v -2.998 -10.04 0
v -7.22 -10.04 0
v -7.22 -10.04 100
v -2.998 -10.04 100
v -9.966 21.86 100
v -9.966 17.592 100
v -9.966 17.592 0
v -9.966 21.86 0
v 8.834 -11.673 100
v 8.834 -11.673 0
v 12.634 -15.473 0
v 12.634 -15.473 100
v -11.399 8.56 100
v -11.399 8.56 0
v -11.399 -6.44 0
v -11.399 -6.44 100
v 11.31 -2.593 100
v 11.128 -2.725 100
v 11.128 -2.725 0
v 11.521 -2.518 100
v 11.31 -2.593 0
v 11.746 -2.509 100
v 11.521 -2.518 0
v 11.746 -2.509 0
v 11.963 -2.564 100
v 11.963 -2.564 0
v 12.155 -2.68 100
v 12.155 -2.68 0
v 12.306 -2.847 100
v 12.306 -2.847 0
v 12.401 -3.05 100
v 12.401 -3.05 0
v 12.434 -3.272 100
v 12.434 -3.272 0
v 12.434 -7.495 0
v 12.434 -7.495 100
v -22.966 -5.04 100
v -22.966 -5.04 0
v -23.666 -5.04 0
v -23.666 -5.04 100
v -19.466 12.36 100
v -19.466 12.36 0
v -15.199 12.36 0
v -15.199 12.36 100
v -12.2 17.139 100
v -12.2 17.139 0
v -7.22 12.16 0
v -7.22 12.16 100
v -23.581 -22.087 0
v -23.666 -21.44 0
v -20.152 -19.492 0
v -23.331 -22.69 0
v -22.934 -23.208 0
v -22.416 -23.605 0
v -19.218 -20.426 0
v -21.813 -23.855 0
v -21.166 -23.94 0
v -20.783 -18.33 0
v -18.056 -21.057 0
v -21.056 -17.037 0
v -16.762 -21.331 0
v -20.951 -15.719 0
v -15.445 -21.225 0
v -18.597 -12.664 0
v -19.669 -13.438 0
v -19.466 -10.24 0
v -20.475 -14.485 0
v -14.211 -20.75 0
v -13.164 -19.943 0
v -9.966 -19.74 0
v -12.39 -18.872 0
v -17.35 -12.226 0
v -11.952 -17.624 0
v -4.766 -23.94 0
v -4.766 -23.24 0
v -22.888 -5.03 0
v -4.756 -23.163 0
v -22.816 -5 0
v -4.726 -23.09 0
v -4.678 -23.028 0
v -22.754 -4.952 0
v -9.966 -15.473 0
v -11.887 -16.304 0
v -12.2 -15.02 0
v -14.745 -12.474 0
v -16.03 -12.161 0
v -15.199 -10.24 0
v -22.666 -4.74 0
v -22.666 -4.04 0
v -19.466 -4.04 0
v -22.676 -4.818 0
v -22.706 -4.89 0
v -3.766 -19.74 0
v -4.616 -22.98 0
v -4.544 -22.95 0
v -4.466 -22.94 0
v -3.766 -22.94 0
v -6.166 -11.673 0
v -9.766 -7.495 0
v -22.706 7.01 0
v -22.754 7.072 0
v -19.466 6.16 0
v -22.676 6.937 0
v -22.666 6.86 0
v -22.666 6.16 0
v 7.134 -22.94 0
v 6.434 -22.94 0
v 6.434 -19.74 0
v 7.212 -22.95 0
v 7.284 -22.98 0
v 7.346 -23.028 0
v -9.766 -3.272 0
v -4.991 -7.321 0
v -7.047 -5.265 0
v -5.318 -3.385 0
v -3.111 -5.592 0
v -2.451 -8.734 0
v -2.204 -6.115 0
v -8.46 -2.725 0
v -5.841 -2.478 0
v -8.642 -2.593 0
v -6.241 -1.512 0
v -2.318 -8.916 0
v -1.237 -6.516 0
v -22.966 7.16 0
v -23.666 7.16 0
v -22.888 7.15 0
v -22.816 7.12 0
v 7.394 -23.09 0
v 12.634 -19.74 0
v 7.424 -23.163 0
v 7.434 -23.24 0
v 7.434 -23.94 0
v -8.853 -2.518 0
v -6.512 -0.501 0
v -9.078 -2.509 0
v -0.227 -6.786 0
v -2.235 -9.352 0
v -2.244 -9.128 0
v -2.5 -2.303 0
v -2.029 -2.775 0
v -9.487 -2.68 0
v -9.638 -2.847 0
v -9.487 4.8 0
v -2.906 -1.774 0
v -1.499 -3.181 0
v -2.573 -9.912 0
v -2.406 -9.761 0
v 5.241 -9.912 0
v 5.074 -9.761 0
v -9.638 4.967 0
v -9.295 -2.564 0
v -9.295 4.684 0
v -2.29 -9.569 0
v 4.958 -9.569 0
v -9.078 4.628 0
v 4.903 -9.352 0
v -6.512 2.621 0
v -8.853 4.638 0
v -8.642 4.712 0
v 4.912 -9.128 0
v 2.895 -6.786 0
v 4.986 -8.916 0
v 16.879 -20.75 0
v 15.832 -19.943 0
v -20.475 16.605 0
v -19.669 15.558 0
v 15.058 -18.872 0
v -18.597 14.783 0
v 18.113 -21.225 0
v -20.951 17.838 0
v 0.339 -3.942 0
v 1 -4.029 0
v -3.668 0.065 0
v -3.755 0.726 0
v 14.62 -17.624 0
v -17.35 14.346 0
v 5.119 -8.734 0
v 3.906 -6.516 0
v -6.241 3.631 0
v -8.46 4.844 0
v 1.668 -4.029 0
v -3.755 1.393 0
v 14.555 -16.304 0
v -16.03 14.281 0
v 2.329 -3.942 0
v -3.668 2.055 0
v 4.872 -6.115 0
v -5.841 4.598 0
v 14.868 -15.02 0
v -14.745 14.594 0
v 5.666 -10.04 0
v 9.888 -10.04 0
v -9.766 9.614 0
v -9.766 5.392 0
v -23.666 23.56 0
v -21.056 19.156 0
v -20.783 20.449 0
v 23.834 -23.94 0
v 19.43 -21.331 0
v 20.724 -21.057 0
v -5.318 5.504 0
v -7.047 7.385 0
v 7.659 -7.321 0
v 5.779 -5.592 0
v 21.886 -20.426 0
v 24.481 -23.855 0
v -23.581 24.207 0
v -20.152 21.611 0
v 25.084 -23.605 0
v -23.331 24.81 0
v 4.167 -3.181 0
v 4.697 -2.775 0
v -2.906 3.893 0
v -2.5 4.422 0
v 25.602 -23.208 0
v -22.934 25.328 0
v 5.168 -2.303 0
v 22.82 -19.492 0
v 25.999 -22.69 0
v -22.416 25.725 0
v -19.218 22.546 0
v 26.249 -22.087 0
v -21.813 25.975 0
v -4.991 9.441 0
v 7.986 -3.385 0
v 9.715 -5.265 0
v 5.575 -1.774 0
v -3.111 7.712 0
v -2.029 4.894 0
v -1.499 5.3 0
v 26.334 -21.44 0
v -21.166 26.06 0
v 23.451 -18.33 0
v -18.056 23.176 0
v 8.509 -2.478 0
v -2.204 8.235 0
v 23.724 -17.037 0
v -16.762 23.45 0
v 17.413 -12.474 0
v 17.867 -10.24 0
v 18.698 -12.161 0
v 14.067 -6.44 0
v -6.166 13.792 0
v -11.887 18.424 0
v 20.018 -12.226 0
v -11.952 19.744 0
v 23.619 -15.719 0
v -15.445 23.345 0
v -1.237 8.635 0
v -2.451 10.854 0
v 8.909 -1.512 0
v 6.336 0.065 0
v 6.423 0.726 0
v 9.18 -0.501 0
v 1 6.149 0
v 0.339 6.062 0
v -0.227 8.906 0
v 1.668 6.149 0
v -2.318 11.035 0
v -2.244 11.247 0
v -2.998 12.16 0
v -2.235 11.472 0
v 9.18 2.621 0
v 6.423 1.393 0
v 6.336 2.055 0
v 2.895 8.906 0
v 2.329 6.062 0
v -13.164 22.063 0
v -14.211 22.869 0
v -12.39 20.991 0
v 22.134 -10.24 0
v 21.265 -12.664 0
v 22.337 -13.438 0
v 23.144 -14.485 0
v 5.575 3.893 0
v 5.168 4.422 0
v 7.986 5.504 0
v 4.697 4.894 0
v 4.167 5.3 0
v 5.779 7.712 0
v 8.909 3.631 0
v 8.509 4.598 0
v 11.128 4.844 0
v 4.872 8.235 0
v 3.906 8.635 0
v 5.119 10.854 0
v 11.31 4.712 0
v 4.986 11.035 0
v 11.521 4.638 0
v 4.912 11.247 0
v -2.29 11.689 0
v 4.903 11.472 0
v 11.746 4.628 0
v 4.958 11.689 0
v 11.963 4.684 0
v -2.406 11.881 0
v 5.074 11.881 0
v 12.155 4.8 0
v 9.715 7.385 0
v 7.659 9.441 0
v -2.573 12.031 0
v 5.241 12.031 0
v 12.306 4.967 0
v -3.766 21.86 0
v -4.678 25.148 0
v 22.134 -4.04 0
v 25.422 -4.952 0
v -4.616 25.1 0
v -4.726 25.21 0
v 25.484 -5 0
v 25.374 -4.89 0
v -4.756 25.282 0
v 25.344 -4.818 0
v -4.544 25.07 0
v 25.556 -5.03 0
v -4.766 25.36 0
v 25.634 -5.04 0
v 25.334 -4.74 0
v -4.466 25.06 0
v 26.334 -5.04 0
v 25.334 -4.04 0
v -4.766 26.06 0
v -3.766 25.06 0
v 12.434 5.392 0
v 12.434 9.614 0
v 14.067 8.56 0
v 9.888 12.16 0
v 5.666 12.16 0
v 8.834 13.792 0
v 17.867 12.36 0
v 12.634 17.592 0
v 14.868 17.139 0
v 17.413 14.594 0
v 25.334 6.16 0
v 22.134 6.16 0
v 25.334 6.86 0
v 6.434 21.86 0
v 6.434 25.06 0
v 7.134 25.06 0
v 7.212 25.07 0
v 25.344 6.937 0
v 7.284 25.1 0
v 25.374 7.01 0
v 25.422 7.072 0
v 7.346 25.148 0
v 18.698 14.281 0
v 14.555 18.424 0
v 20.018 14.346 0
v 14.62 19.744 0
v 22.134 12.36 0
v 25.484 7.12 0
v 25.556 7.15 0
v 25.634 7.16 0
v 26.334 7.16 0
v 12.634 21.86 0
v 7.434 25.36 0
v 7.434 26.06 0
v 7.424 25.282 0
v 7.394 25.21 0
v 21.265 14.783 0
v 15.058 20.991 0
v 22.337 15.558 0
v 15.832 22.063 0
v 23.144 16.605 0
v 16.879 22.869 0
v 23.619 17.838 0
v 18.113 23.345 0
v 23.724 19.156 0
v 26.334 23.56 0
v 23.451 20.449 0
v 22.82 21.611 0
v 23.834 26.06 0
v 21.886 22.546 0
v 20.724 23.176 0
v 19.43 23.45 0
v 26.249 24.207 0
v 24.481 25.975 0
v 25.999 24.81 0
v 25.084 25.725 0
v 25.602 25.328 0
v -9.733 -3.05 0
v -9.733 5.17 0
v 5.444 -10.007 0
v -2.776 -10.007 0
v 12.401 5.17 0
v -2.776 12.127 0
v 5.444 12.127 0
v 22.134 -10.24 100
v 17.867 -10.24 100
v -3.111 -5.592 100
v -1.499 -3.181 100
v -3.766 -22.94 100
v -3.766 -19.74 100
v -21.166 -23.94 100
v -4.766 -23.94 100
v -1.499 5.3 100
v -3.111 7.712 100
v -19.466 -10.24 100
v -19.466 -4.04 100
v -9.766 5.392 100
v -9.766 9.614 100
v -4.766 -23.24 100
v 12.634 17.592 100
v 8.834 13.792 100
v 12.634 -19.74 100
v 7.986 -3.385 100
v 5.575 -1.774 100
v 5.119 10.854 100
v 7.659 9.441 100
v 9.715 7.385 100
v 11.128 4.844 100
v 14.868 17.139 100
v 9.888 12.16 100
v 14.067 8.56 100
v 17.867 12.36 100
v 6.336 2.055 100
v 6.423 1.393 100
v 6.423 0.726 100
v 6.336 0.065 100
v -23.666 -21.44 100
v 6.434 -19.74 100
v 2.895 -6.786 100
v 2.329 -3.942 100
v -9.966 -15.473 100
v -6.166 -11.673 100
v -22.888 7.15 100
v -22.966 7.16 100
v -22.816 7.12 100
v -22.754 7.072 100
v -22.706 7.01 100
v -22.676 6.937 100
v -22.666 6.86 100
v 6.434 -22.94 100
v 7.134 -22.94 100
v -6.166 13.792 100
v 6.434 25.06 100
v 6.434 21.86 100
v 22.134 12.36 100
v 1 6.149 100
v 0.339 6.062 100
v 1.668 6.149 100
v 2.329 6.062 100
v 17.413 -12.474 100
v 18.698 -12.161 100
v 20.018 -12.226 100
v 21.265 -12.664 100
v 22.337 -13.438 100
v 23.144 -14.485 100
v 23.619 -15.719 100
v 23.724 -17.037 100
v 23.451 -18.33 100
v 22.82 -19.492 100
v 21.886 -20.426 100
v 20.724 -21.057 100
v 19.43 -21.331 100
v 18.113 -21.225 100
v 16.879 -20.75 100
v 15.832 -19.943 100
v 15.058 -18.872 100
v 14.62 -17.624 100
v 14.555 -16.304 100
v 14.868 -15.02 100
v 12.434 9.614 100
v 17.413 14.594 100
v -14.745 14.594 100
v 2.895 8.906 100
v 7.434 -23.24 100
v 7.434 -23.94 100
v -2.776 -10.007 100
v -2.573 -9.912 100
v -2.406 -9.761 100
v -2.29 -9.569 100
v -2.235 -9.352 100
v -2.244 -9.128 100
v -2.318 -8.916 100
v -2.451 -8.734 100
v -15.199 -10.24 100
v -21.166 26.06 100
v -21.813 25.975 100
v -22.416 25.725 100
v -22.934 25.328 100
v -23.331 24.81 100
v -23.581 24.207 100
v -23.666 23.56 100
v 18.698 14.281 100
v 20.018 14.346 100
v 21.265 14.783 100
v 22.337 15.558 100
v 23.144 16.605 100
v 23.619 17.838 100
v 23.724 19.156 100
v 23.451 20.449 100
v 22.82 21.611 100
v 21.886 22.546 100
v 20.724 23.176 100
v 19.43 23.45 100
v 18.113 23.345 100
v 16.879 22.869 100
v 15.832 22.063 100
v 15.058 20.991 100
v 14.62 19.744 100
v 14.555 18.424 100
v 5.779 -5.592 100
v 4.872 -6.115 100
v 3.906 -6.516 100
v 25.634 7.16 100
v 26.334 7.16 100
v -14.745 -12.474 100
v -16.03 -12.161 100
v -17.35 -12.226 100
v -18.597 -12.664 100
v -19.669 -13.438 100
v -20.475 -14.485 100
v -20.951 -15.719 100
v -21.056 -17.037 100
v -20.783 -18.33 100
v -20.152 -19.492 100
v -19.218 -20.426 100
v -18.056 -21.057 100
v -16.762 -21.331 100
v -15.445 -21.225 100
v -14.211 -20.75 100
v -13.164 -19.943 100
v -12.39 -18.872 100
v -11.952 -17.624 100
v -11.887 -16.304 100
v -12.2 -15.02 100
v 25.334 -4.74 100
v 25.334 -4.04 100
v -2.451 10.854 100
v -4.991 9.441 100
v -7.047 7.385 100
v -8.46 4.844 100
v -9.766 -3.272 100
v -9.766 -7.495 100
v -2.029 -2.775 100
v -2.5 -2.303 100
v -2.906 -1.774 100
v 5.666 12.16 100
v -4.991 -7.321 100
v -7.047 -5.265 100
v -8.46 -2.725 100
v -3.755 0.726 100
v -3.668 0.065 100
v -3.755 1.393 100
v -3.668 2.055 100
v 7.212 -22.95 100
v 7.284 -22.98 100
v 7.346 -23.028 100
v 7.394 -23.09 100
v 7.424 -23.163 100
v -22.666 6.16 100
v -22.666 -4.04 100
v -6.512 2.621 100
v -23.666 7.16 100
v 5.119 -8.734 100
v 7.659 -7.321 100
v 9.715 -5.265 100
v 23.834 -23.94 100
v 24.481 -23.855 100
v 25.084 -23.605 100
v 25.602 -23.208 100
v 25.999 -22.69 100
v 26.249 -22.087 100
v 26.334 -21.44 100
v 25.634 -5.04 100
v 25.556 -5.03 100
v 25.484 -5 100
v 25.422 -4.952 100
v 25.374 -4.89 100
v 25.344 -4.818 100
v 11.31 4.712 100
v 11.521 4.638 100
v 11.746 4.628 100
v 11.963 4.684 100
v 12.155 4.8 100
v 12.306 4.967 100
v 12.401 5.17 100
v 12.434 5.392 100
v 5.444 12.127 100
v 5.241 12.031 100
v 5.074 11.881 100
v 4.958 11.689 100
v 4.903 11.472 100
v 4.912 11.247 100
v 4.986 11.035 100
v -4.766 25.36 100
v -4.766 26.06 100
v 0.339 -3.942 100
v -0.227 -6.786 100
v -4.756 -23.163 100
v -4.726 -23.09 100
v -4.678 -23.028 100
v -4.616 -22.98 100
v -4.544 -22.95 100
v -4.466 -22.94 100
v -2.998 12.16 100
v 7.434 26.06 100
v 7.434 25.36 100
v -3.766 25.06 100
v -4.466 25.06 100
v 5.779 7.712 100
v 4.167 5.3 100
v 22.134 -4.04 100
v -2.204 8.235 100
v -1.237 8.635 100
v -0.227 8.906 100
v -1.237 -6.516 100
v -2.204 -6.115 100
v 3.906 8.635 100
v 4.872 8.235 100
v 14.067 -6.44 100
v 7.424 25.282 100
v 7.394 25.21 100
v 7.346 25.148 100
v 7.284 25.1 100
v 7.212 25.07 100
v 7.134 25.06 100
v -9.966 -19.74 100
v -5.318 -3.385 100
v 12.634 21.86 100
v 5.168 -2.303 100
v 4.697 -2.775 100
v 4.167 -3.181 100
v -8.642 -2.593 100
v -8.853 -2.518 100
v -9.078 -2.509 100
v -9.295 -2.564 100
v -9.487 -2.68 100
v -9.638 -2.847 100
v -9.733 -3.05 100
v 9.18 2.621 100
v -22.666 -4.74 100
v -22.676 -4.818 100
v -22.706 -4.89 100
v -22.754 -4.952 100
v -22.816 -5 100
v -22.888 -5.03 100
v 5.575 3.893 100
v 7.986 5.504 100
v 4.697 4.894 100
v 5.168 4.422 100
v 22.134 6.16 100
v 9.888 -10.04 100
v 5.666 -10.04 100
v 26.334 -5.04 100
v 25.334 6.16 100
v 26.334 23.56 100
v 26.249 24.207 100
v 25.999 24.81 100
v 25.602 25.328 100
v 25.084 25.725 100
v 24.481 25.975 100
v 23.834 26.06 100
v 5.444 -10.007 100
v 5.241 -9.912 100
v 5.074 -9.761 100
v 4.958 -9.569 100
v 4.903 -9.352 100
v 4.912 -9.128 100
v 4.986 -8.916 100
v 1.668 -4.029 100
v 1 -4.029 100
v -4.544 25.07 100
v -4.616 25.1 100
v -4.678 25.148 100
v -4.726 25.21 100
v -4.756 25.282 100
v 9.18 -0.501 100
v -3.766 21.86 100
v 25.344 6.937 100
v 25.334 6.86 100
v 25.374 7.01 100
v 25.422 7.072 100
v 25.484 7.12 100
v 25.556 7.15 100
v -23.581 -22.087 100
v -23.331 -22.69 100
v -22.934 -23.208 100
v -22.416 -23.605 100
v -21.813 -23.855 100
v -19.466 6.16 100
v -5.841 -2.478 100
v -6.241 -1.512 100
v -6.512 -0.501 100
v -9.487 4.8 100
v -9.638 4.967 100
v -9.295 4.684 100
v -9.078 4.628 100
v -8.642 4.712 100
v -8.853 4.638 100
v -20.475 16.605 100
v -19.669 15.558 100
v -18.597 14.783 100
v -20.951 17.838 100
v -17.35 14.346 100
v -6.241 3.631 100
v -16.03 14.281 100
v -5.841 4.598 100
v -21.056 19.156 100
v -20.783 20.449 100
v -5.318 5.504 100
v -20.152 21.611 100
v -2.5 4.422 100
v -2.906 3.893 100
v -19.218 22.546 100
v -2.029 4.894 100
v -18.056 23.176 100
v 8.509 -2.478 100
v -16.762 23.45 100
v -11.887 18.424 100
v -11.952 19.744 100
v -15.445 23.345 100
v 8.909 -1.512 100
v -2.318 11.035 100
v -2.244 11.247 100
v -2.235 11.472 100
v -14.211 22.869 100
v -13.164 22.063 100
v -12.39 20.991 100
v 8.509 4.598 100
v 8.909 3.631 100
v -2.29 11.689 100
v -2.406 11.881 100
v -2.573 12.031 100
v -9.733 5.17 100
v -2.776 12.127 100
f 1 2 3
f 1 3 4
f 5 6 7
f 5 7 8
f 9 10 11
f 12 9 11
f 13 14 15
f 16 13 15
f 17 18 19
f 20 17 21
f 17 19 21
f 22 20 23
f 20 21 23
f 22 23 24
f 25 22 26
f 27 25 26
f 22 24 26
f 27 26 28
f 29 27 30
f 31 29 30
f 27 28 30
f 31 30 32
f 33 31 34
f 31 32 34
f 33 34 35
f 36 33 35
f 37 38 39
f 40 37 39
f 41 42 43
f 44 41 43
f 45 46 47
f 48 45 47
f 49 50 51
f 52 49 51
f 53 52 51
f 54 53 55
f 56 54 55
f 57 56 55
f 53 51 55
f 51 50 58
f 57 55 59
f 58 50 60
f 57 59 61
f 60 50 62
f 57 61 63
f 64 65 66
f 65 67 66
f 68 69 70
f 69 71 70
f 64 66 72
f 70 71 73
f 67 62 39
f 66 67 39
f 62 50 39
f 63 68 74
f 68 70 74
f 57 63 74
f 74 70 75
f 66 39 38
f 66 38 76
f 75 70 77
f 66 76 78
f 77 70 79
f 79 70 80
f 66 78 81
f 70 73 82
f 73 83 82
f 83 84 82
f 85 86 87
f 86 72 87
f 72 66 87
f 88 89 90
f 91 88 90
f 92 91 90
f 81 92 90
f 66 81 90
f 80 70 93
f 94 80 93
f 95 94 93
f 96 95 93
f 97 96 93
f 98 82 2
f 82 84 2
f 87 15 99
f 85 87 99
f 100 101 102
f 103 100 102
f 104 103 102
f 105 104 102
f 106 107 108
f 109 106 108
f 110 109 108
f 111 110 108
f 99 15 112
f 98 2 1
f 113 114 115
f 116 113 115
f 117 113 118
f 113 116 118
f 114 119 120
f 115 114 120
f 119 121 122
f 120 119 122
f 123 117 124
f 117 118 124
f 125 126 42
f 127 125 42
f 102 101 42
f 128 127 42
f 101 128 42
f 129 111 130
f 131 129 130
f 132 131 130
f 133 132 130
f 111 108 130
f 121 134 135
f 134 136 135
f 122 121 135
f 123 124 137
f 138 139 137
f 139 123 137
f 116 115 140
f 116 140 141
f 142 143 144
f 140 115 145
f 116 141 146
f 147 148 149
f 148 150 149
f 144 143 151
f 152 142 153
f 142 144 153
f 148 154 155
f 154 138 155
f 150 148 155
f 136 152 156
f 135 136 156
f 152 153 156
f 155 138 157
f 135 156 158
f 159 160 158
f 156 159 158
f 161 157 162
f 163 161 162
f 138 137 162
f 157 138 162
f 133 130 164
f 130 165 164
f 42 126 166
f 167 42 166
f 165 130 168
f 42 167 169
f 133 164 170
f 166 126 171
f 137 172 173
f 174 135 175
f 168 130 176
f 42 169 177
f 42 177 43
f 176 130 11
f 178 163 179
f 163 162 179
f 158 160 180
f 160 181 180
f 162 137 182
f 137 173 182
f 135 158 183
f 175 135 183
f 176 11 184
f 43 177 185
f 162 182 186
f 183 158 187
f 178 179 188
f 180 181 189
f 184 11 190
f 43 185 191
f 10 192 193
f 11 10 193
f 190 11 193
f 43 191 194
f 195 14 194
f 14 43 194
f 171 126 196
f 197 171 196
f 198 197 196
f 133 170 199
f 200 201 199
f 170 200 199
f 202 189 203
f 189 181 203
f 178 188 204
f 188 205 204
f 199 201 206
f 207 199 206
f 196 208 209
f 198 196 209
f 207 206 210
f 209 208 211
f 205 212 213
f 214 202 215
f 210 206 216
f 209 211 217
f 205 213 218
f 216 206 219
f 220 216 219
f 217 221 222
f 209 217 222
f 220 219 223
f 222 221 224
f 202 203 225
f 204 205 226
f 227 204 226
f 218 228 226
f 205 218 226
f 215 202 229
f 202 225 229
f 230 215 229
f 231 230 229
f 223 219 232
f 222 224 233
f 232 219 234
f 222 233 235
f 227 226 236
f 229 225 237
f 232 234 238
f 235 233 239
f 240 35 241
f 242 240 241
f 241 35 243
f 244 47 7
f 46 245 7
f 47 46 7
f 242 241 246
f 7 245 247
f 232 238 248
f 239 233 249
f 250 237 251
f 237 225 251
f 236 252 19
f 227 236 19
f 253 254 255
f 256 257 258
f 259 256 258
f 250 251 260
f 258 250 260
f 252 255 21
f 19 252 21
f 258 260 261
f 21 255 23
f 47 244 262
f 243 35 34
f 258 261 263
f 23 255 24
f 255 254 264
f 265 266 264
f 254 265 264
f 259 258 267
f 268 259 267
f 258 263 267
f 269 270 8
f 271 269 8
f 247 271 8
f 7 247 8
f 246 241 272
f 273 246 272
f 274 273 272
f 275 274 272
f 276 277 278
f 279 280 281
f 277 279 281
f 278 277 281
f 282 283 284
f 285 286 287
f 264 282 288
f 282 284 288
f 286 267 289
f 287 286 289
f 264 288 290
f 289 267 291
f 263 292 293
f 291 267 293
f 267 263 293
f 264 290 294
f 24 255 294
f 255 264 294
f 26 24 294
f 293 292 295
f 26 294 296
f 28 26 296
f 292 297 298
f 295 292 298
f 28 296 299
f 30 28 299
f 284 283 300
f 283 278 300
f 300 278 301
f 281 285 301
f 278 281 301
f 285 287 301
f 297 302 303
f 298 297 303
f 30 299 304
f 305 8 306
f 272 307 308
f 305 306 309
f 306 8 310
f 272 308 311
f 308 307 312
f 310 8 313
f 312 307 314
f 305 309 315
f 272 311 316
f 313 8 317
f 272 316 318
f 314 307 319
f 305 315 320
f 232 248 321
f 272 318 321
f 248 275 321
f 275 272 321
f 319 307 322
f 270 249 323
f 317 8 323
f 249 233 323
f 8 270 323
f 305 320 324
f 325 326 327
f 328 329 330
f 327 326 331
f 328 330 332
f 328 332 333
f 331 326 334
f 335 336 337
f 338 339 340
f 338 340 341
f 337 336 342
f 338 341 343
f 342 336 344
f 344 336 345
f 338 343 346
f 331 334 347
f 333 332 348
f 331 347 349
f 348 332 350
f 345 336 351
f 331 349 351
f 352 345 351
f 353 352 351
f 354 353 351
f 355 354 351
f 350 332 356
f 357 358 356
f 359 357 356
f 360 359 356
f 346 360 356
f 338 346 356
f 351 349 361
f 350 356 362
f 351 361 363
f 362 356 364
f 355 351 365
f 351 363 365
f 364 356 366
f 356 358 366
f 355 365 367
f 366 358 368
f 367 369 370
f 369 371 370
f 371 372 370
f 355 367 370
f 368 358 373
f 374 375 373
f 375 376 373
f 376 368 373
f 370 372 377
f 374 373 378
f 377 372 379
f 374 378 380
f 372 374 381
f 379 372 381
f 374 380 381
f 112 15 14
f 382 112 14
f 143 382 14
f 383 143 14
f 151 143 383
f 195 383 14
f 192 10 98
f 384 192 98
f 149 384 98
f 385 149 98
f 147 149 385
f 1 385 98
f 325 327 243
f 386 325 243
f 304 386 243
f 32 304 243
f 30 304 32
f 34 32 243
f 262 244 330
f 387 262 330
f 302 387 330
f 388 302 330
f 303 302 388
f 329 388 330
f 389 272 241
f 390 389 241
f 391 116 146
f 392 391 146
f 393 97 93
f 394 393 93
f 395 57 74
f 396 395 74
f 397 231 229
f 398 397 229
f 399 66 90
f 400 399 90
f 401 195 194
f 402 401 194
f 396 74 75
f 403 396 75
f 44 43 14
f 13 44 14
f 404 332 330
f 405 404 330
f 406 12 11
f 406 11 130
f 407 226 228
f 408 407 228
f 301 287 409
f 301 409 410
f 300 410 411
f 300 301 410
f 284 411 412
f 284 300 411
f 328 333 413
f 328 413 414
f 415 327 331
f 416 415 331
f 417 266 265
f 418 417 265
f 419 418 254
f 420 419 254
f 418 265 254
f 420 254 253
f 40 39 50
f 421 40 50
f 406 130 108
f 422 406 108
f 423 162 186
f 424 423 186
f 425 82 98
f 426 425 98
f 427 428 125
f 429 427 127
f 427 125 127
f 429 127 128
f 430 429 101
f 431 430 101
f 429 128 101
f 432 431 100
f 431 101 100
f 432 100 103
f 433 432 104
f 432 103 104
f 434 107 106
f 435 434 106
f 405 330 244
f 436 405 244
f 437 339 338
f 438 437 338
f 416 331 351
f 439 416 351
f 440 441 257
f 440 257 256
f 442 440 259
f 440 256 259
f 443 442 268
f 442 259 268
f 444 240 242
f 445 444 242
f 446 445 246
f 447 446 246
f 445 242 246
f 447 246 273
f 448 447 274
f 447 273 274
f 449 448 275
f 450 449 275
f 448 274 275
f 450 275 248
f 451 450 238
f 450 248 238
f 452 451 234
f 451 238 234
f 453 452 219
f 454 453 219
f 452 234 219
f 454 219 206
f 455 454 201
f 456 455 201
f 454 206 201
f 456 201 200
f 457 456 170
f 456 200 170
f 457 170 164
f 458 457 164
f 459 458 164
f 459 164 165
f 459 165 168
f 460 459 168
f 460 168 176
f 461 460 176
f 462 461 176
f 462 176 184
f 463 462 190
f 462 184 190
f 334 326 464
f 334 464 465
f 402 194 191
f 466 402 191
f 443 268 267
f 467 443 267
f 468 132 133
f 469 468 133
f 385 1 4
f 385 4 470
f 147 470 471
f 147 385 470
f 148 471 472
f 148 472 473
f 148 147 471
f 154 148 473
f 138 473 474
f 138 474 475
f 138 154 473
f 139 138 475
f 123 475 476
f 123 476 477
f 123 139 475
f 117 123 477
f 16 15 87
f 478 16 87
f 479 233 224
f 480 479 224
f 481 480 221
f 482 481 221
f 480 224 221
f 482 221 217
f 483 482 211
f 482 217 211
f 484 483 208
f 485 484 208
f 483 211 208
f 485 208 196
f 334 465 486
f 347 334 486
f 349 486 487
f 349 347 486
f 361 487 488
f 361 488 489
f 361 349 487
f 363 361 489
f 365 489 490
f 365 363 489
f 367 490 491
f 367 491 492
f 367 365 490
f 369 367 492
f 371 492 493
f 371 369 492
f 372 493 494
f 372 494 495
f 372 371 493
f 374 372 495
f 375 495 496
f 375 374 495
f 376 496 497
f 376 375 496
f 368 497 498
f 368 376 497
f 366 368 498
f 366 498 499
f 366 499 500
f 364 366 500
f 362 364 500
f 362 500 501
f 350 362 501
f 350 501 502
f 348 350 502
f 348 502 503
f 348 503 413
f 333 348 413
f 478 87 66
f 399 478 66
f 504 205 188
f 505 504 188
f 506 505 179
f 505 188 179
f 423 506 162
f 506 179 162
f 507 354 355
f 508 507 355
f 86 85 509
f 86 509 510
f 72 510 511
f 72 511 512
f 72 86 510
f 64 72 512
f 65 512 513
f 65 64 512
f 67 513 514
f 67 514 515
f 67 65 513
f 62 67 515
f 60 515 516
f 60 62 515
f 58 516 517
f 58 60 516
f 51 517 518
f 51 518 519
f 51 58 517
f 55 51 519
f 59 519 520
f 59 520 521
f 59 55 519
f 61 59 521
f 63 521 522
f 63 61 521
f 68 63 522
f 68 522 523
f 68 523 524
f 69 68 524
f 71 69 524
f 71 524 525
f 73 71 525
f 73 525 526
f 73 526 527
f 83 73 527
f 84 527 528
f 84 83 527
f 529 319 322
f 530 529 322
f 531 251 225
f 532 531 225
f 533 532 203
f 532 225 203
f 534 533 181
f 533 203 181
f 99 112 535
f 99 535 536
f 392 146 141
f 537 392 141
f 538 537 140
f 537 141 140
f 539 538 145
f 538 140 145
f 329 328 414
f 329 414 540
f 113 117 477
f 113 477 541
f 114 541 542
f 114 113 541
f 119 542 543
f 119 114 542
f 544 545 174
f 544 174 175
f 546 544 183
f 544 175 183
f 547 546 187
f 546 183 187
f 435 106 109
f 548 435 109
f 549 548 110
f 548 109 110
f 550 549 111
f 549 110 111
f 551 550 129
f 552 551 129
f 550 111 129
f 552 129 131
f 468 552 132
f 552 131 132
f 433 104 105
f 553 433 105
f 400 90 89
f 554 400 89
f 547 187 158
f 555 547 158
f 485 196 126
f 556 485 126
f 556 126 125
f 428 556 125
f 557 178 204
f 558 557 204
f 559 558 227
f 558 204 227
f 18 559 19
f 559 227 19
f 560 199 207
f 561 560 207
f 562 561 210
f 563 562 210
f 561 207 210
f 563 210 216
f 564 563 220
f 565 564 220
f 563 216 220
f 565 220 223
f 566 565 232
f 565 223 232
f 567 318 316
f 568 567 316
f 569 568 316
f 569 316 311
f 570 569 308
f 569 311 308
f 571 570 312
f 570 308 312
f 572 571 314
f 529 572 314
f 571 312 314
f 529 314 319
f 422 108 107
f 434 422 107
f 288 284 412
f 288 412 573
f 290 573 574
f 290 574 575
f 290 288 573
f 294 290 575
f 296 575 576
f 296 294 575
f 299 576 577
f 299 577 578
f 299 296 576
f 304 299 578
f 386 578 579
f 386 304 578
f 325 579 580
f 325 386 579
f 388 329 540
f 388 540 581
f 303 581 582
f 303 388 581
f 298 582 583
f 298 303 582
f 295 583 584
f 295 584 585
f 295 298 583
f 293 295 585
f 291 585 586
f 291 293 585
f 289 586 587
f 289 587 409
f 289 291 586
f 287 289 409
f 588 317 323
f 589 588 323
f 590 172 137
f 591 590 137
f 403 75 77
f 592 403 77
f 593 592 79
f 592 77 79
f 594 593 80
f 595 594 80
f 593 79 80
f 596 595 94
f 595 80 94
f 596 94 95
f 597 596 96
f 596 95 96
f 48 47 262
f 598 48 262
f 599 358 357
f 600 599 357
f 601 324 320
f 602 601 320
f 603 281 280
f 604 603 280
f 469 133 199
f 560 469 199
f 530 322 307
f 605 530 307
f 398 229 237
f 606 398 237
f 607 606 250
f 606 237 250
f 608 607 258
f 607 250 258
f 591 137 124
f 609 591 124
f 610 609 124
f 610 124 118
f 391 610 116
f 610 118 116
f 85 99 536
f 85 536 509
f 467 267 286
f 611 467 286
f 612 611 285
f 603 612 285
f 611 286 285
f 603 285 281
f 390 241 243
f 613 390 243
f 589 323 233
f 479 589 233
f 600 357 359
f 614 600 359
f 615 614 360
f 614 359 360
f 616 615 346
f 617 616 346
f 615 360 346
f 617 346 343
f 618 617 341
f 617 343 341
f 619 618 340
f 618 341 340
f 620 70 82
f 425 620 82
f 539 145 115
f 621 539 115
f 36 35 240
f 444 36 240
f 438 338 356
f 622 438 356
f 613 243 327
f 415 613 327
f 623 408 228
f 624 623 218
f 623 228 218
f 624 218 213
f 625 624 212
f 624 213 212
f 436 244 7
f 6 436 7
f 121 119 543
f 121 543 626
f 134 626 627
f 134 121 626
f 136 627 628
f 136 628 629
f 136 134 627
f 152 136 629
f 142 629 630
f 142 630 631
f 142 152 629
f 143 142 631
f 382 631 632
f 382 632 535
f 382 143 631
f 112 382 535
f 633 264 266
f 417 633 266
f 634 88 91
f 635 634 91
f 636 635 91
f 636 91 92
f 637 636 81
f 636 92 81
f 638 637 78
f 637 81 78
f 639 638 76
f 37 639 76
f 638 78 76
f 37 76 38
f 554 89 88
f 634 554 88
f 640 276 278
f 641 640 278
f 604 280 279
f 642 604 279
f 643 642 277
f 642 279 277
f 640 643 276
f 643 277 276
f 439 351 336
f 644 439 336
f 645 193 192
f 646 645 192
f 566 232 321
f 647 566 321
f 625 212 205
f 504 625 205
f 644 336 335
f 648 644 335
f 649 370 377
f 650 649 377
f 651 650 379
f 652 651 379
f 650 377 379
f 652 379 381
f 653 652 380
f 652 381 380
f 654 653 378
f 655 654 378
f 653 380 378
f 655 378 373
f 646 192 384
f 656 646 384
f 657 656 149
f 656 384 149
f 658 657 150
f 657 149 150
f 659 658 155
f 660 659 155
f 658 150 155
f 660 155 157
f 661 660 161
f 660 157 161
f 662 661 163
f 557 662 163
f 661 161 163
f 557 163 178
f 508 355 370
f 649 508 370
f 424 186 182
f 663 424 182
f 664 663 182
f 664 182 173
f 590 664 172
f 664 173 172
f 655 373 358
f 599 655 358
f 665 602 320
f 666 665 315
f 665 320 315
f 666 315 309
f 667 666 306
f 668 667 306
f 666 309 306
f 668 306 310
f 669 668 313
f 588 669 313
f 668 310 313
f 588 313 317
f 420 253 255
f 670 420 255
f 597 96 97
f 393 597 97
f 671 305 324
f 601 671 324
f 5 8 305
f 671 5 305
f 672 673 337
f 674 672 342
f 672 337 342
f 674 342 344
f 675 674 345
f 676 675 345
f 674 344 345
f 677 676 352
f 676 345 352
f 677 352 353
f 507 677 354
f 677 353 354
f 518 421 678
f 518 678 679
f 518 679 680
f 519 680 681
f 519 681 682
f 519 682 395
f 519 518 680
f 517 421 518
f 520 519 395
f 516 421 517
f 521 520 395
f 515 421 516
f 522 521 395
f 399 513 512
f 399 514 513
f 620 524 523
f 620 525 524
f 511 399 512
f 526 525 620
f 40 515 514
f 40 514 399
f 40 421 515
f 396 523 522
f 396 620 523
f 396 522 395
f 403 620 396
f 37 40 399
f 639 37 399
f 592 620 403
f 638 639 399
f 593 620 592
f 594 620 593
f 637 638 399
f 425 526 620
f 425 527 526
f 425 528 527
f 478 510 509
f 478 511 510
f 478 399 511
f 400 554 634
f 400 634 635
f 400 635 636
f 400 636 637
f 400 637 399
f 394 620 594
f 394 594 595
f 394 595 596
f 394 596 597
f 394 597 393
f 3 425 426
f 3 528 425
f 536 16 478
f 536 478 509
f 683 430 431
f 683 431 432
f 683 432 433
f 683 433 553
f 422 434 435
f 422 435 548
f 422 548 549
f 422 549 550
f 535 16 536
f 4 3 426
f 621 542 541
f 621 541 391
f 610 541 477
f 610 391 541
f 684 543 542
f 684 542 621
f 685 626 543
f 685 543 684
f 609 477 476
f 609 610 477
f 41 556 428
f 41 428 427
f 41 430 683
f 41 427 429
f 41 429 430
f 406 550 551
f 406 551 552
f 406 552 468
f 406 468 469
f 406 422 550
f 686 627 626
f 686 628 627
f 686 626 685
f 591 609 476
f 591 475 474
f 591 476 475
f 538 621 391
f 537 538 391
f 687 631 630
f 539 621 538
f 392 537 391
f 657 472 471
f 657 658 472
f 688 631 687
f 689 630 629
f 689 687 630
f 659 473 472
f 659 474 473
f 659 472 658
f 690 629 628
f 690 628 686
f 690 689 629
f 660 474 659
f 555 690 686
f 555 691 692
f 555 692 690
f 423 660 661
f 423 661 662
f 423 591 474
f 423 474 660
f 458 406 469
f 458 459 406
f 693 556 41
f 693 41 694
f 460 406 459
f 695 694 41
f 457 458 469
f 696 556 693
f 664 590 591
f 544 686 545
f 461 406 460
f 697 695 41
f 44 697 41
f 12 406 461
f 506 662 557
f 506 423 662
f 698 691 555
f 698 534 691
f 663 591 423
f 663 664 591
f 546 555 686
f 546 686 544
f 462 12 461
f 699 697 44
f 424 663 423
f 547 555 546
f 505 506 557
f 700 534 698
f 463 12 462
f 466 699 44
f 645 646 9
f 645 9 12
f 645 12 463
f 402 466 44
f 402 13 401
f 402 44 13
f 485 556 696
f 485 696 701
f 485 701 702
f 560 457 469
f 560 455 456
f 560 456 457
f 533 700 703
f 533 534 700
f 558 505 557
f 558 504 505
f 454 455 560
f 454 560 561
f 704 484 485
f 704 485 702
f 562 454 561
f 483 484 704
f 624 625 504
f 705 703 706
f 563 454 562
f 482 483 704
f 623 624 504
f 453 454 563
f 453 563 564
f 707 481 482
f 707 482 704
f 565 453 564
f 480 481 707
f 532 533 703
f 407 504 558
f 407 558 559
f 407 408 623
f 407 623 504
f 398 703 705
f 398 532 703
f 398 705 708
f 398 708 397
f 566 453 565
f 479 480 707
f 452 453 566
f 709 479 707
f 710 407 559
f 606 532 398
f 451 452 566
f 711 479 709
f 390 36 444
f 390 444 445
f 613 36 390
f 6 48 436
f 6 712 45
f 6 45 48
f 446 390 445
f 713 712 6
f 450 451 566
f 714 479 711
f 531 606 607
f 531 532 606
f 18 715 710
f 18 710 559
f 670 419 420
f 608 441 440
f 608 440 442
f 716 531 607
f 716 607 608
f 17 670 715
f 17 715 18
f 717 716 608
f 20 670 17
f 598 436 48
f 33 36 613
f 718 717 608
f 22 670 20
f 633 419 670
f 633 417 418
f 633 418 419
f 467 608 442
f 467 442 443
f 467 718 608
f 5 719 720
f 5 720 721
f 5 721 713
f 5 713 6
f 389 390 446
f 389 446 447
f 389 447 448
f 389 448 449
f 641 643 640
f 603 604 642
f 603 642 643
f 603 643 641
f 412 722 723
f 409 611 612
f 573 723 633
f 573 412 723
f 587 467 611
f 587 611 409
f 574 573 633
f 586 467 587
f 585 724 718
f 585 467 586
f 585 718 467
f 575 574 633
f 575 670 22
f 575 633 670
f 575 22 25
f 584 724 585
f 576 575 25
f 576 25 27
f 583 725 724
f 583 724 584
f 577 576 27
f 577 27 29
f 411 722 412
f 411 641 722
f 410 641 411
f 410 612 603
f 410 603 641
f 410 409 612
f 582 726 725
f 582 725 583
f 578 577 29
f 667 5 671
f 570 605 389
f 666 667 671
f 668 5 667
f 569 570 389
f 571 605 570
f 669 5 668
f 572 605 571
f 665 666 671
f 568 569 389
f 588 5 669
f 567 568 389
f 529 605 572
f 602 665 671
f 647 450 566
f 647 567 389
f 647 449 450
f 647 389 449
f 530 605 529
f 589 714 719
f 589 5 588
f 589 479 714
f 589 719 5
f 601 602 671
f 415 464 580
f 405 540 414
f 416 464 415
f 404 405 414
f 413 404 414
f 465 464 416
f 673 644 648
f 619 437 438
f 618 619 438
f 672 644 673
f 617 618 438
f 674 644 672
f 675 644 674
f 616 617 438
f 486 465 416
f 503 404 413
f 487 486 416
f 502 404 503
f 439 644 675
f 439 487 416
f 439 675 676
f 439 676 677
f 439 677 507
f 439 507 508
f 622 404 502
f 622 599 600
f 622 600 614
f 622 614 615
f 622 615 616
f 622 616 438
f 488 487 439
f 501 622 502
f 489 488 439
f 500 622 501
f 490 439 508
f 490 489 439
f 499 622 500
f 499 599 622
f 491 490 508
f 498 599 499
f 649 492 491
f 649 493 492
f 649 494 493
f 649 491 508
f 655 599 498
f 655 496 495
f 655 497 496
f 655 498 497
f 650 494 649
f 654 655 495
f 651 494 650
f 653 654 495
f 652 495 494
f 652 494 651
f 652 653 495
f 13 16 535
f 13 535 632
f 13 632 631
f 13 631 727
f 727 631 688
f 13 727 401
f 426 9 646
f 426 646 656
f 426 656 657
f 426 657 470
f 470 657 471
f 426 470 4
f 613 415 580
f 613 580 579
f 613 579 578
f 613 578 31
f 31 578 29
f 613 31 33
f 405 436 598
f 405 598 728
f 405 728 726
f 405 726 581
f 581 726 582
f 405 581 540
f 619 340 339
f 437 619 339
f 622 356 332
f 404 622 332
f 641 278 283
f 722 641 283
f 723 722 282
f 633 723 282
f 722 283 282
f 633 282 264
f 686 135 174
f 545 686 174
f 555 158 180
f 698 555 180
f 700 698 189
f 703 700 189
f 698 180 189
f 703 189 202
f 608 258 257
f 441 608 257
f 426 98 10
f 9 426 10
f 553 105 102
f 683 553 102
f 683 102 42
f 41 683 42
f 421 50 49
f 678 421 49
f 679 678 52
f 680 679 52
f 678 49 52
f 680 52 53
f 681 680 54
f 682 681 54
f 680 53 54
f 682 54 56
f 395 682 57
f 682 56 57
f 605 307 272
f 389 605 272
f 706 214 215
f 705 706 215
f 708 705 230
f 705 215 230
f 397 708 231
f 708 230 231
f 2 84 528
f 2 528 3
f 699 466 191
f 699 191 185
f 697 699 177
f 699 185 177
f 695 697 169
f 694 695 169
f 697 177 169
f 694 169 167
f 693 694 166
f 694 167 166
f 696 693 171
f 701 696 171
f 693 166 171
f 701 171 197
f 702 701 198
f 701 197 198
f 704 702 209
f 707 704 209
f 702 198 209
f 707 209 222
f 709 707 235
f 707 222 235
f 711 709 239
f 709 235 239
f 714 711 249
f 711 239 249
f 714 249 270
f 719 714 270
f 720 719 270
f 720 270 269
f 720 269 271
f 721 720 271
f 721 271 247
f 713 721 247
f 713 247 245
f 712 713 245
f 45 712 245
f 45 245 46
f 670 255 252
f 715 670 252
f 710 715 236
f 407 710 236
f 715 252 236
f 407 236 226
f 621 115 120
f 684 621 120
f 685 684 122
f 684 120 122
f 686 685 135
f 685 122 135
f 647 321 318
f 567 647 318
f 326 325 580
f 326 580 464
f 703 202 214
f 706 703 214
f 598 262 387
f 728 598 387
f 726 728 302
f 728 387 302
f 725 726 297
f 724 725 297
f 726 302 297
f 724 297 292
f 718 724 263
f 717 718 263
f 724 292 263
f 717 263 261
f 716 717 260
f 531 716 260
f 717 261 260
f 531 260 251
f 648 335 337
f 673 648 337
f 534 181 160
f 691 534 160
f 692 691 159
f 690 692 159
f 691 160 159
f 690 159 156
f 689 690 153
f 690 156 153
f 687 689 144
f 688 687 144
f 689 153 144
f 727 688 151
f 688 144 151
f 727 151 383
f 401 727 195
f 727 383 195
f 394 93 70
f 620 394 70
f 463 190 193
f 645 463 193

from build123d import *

# Parameters (mm, degrees)
EXTRUDE_1_DEPTH = 100


with BuildPart() as part:
    # 草图1 → 凸台-拉伸1 (new body)
    with BuildSketch(Plane.XY):
        with BuildLine():
            Line((-4.765977756, 26.059817672), (-21.165977756, 26.059817672))
            ThreePointArc((-21.165977756, 26.059817672), (-22.933744709, 25.327584625), (-23.665977756, 23.559817672))
            Line((-23.665977756, 23.559817672), (-23.665977756, 7.159817672))
            Line((-23.665977756, 7.159817672), (-22.965977756, 7.159817672))
            ThreePointArc((-22.965977756, 7.159817672), (-22.753845722, 7.071949706), (-22.665977756, 6.859817672))
            Line((-22.665977756, 6.859817672), (-22.665977756, 6.159817672))
            Line((-22.665977756, 6.159817672), (-19.465977756, 6.159817672))
            Line((-19.465977756, 6.159817672), (-19.465977756, 12.359817672))
            Line((-19.465977756, 12.359817672), (-15.198567937, 12.359817672))
            Line((-15.198567937, 12.359817672), (-11.398567937, 8.559817672))
            Line((-11.398567937, 8.559817672), (-11.398567937, 1.059817672))
            Line((-11.398567937, 1.059817672), (-11.398567937, -6.440182328))
            Line((-11.398567937, -6.440182328), (-15.198567937, -10.240182328))
            Line((-15.198567937, -10.240182328), (-19.465977756, -10.240182328))
            Line((-19.465977756, -10.240182328), (-19.465977756, -4.040182328))
            Line((-19.465977756, -4.040182328), (-22.665977756, -4.040182328))
            Line((-22.665977756, -4.040182328), (-22.665977756, -4.740182328))
            ThreePointArc((-22.665977756, -4.740182328), (-22.753845722, -4.952314363), (-22.965977756, -5.040182328))
            Line((-22.965977756, -5.040182328), (-23.665977756, -5.040182328))
            Line((-23.665977756, -5.040182328), (-23.665977756, -21.440182328))
            ThreePointArc((-23.665977756, -21.440182328), (-22.933744709, -23.207949281), (-21.165977756, -23.940182328))
            Line((-21.165977756, -23.940182328), (-4.765977756, -23.940182328))
            Line((-4.765977756, -23.940182328), (-4.765977756, -23.240182328))
            ThreePointArc((-4.765977756, -23.240182328), (-4.67810979, -23.028050294), (-4.465977756, -22.940182328))
            Line((-4.465977756, -22.940182328), (-3.765977756, -22.940182328))
            Line((-3.765977756, -22.940182328), (-3.765977756, -19.740182328))
            Line((-3.765977756, -19.740182328), (-9.965977756, -19.740182328))
            Line((-9.965977756, -19.740182328), (-9.965977756, -15.472772509))
            Line((-9.965977756, -15.472772509), (-6.165977756, -11.672772509))
            Line((-6.165977756, -11.672772509), (1.334022244, -11.672772509))
            Line((1.334022244, -11.672772509), (8.834022244, -11.672772509))
            Line((8.834022244, -11.672772509), (12.634022244, -15.472772509))
            Line((12.634022244, -15.472772509), (12.634022244, -19.740182328))
            Line((12.634022244, -19.740182328), (6.434022244, -19.740182328))
            Line((6.434022244, -19.740182328), (6.434022244, -22.940182328))
            Line((6.434022244, -22.940182328), (7.134022244, -22.940182328))
            ThreePointArc((7.134022244, -22.940182328), (7.346154278, -23.028050294), (7.434022244, -23.240182328))
            Line((7.434022244, -23.240182328), (7.434022244, -23.940182328))
            Line((7.434022244, -23.940182328), (23.834022244, -23.940182328))
            ThreePointArc((23.834022244, -23.940182328), (25.601789197, -23.207949281), (26.334022244, -21.440182328))
            Line((26.334022244, -21.440182328), (26.334022244, -5.040182328))
            Line((26.334022244, -5.040182328), (25.634022244, -5.040182328))
            ThreePointArc((25.634022244, -5.040182328), (25.42189021, -4.952314363), (25.334022244, -4.740182328))
            Line((25.334022244, -4.740182328), (25.334022244, -4.040182328))
            Line((25.334022244, -4.040182328), (22.134022244, -4.040182328))
            Line((22.134022244, -4.040182328), (22.134022244, -10.240182328))
            Line((22.134022244, -10.240182328), (17.866612425, -10.240182328))
            Line((17.866612425, -10.240182328), (14.066612425, -6.440182328))
            Line((14.066612425, -6.440182328), (14.066612425, 1.059817672))
            Line((14.066612425, 1.059817672), (14.066612425, 8.559817672))
            Line((14.066612425, 8.559817672), (17.866612425, 12.359817672))
            Line((17.866612425, 12.359817672), (22.134022244, 12.359817672))
            Line((22.134022244, 12.359817672), (22.134022244, 6.159817672))
            Line((22.134022244, 6.159817672), (25.334022244, 6.159817672))
            Line((25.334022244, 6.159817672), (25.334022244, 6.859817672))
            ThreePointArc((25.334022244, 6.859817672), (25.42189021, 7.071949706), (25.634022244, 7.159817672))
            Line((25.634022244, 7.159817672), (26.334022244, 7.159817672))
            Line((26.334022244, 7.159817672), (26.334022244, 23.559817672))
            ThreePointArc((26.334022244, 23.559817672), (25.601789197, 25.327584625), (23.834022244, 26.059817672))
            Line((23.834022244, 26.059817672), (7.434022244, 26.059817672))
            Line((7.434022244, 26.059817672), (7.434022244, 25.359817672))
            ThreePointArc((7.434022244, 25.359817672), (7.346154278, 25.147685637), (7.134022244, 25.059817672))
            Line((7.134022244, 25.059817672), (6.434022244, 25.059817672))
            Line((6.434022244, 25.059817672), (6.434022244, 21.859817672))
            Line((6.434022244, 21.859817672), (12.634022244, 21.859817672))
            Line((12.634022244, 21.859817672), (12.634022244, 17.592407853))
            Line((12.634022244, 17.592407853), (8.834022244, 13.792407853))
            Line((8.834022244, 13.792407853), (1.334022244, 13.792407853))
            Line((1.334022244, 13.792407853), (-6.165977756, 13.792407853))
            Line((-6.165977756, 13.792407853), (-9.965977756, 17.592407853))
            Line((-9.965977756, 17.592407853), (-9.965977756, 21.859817672))
            Line((-9.965977756, 21.859817672), (-3.765977756, 21.859817672))
            Line((-3.765977756, 21.859817672), (-3.765977756, 25.059817672))
            Line((-3.765977756, 25.059817672), (-4.465977756, 25.059817672))
            ThreePointArc((-4.465977756, 25.059817672), (-4.67810979, 25.147685637), (-4.765977756, 25.359817672))
            Line((-4.765977756, 25.359817672), (-4.765977756, 26.059817672))
        make_face()
        with BuildLine():
            Line((-9.765977756, 5.391903688), (-9.765977756, 9.61423326))
            Line((-9.765977756, 9.61423326), (-14.745444053, 14.593699556))
            ThreePointArc((-14.745444053, 14.593699556), (-19.718668949, 22.112508865), (-12.19985964, 17.139283969))
            Line((-12.19985964, 17.139283969), (-7.220393344, 12.159817672))
            Line((-7.220393344, 12.159817672), (-2.998063772, 12.159817672))
            ThreePointArc((-2.998063772, 12.159817672), (-2.29011, 11.688982743), (-2.450583757, 10.854038285))
            ThreePointArc((-2.450583757, 10.854038285), (-6.090598958, 8.484438874), (-8.460198369, 4.844423672))
            ThreePointArc((-8.460198369, 4.844423672), (-9.295142827, 4.683949916), (-9.765977756, 5.391903688))
        make_face(mode=Mode.SUBTRACT)
        with BuildLine():
            Line((-3.11053962, -5.591939227), (-1.499385944, -3.180677351))
            ThreePointArc((-1.499385944, -3.180677351), (-2.27222234, -2.546426912), (-2.906472779, -1.773590517))
            Line((-2.906472779, -1.773590517), (-5.317734654, -3.384744192))
            ThreePointArc((-5.317734654, -3.384744192), (-6.057014016, -2.001649787), (-6.512259999, -0.500904904))
            Line((-6.512259999, -0.500904904), (-3.667982686, 0.06485703))
            ThreePointArc((-3.667982686, 0.06485703), (-3.765977756, 1.059817672), (-3.667982686, 2.054778314))
            Line((-3.667982686, 2.054778314), (-6.512259999, 2.620540248))
            ThreePointArc((-6.512259999, 2.620540248), (-6.057014016, 4.121285131), (-5.317734654, 5.504379536))
            Line((-5.317734654, 5.504379536), (-2.906472779, 3.89322586))
            ThreePointArc((-2.906472779, 3.89322586), (-2.27222234, 4.666062256), (-1.499385944, 5.300312695))
            Line((-1.499385944, 5.300312695), (-3.11053962, 7.71157457))
            ThreePointArc((-3.11053962, 7.71157457), (-1.727445215, 8.450853932), (-0.226700332, 8.906099915))
            Line((-0.226700332, 8.906099915), (0.339061602, 6.061822602))
            ThreePointArc((0.339061602, 6.061822602), (1.334022244, 6.159817672), (2.328982886, 6.061822602))
            Line((2.328982886, 6.061822602), (2.89474482, 8.906099915))
            ThreePointArc((2.89474482, 8.906099915), (4.395489703, 8.450853932), (5.778584108, 7.71157457))
            Line((5.778584108, 7.71157457), (4.167430432, 5.300312695))
            ThreePointArc((4.167430432, 5.300312695), (4.940266828, 4.666062256), (5.574517267, 3.89322586))
            Line((5.574517267, 3.89322586), (7.985779142, 5.504379536))
            ThreePointArc((7.985779142, 5.504379536), (8.725058504, 4.121285131), (9.180304487, 2.620540248))
            Line((9.180304487, 2.620540248), (6.336027174, 2.054778314))
            ThreePointArc((6.336027174, 2.054778314), (6.434022244, 1.059817672), (6.336027174, 0.06485703))
            Line((6.336027174, 0.06485703), (9.180304487, -0.500904904))
            ThreePointArc((9.180304487, -0.500904904), (8.725058504, -2.001649787), (7.985779142, -3.384744192))
            Line((7.985779142, -3.384744192), (5.574517267, -1.773590517))
            ThreePointArc((5.574517267, -1.773590517), (4.940266828, -2.546426912), (4.167430432, -3.180677351))
            Line((4.167430432, -3.180677351), (5.778584108, -5.591939227))
            ThreePointArc((5.778584108, -5.591939227), (4.395489703, -6.331218588), (2.89474482, -6.786464571))
            Line((2.89474482, -6.786464571), (2.328982886, -3.942187258))
            ThreePointArc((2.328982886, -3.942187258), (1.334022244, -4.040182328), (0.339061602, -3.942187258))
            Line((0.339061602, -3.942187258), (-0.226700332, -6.786464571))
            ThreePointArc((-0.226700332, -6.786464571), (-1.727445215, -6.331218588), (-3.11053962, -5.591939227))
        make_face(mode=Mode.SUBTRACT)
        with BuildLine():
            Line((12.434022244, 5.391903688), (12.434022244, 9.61423326))
            Line((12.434022244, 9.61423326), (17.413488541, 14.593699556))
            ThreePointArc((17.413488541, 14.593699556), (22.386713437, 22.112508865), (14.867904128, 17.139283969))
            Line((14.867904128, 17.139283969), (9.888437832, 12.159817672))
            Line((9.888437832, 12.159817672), (5.66610826, 12.159817672))
            ThreePointArc((5.66610826, 12.159817672), (4.958154488, 11.688982743), (5.118628245, 10.854038285))
            ThreePointArc((5.118628245, 10.854038285), (8.758643446, 8.484438874), (11.128242857, 4.844423672))
            ThreePointArc((11.128242857, 4.844423672), (11.963187315, 4.683949916), (12.434022244, 5.391903688))
        make_face(mode=Mode.SUBTRACT)
        with BuildLine():
            Line((-9.765977756, -3.272268344), (-9.765977756, -7.494597916))
            Line((-9.765977756, -7.494597916), (-14.745444053, -12.474064213))
            ThreePointArc((-14.745444053, -12.474064213), (-19.718668949, -19.992873522), (-12.19985964, -15.019648625))
            Line((-12.19985964, -15.019648625), (-7.220393344, -10.040182328))
            Line((-7.220393344, -10.040182328), (-2.998063772, -10.040182328))
            ThreePointArc((-2.998063772, -10.040182328), (-2.29011, -9.569347399), (-2.450583757, -8.734402941))
            ThreePointArc((-2.450583757, -8.734402941), (-6.090598958, -6.364803531), (-8.460198369, -2.724788329))
            ThreePointArc((-8.460198369, -2.724788329), (-9.295142827, -2.564314572), (-9.765977756, -3.272268344))
        make_face(mode=Mode.SUBTRACT)
        with BuildLine():
            Line((12.434022244, -3.272268344), (12.434022244, -7.494597916))
            Line((12.434022244, -7.494597916), (17.413488541, -12.474064213))
            ThreePointArc((17.413488541, -12.474064213), (22.386713437, -19.992873522), (14.867904128, -15.019648625))
            Line((14.867904128, -15.019648625), (9.888437832, -10.040182328))
            Line((9.888437832, -10.040182328), (5.66610826, -10.040182328))
            ThreePointArc((5.66610826, -10.040182328), (4.958154488, -9.569347399), (5.118628245, -8.734402941))
            ThreePointArc((5.118628245, -8.734402941), (8.758643446, -6.364803531), (11.128242857, -2.724788329))
            ThreePointArc((11.128242857, -2.724788329), (11.963187315, -2.564314572), (12.434022244, -3.272268344))
        make_face(mode=Mode.SUBTRACT)
    extrude(amount=EXTRUDE_1_DEPTH)


solid = part.part
